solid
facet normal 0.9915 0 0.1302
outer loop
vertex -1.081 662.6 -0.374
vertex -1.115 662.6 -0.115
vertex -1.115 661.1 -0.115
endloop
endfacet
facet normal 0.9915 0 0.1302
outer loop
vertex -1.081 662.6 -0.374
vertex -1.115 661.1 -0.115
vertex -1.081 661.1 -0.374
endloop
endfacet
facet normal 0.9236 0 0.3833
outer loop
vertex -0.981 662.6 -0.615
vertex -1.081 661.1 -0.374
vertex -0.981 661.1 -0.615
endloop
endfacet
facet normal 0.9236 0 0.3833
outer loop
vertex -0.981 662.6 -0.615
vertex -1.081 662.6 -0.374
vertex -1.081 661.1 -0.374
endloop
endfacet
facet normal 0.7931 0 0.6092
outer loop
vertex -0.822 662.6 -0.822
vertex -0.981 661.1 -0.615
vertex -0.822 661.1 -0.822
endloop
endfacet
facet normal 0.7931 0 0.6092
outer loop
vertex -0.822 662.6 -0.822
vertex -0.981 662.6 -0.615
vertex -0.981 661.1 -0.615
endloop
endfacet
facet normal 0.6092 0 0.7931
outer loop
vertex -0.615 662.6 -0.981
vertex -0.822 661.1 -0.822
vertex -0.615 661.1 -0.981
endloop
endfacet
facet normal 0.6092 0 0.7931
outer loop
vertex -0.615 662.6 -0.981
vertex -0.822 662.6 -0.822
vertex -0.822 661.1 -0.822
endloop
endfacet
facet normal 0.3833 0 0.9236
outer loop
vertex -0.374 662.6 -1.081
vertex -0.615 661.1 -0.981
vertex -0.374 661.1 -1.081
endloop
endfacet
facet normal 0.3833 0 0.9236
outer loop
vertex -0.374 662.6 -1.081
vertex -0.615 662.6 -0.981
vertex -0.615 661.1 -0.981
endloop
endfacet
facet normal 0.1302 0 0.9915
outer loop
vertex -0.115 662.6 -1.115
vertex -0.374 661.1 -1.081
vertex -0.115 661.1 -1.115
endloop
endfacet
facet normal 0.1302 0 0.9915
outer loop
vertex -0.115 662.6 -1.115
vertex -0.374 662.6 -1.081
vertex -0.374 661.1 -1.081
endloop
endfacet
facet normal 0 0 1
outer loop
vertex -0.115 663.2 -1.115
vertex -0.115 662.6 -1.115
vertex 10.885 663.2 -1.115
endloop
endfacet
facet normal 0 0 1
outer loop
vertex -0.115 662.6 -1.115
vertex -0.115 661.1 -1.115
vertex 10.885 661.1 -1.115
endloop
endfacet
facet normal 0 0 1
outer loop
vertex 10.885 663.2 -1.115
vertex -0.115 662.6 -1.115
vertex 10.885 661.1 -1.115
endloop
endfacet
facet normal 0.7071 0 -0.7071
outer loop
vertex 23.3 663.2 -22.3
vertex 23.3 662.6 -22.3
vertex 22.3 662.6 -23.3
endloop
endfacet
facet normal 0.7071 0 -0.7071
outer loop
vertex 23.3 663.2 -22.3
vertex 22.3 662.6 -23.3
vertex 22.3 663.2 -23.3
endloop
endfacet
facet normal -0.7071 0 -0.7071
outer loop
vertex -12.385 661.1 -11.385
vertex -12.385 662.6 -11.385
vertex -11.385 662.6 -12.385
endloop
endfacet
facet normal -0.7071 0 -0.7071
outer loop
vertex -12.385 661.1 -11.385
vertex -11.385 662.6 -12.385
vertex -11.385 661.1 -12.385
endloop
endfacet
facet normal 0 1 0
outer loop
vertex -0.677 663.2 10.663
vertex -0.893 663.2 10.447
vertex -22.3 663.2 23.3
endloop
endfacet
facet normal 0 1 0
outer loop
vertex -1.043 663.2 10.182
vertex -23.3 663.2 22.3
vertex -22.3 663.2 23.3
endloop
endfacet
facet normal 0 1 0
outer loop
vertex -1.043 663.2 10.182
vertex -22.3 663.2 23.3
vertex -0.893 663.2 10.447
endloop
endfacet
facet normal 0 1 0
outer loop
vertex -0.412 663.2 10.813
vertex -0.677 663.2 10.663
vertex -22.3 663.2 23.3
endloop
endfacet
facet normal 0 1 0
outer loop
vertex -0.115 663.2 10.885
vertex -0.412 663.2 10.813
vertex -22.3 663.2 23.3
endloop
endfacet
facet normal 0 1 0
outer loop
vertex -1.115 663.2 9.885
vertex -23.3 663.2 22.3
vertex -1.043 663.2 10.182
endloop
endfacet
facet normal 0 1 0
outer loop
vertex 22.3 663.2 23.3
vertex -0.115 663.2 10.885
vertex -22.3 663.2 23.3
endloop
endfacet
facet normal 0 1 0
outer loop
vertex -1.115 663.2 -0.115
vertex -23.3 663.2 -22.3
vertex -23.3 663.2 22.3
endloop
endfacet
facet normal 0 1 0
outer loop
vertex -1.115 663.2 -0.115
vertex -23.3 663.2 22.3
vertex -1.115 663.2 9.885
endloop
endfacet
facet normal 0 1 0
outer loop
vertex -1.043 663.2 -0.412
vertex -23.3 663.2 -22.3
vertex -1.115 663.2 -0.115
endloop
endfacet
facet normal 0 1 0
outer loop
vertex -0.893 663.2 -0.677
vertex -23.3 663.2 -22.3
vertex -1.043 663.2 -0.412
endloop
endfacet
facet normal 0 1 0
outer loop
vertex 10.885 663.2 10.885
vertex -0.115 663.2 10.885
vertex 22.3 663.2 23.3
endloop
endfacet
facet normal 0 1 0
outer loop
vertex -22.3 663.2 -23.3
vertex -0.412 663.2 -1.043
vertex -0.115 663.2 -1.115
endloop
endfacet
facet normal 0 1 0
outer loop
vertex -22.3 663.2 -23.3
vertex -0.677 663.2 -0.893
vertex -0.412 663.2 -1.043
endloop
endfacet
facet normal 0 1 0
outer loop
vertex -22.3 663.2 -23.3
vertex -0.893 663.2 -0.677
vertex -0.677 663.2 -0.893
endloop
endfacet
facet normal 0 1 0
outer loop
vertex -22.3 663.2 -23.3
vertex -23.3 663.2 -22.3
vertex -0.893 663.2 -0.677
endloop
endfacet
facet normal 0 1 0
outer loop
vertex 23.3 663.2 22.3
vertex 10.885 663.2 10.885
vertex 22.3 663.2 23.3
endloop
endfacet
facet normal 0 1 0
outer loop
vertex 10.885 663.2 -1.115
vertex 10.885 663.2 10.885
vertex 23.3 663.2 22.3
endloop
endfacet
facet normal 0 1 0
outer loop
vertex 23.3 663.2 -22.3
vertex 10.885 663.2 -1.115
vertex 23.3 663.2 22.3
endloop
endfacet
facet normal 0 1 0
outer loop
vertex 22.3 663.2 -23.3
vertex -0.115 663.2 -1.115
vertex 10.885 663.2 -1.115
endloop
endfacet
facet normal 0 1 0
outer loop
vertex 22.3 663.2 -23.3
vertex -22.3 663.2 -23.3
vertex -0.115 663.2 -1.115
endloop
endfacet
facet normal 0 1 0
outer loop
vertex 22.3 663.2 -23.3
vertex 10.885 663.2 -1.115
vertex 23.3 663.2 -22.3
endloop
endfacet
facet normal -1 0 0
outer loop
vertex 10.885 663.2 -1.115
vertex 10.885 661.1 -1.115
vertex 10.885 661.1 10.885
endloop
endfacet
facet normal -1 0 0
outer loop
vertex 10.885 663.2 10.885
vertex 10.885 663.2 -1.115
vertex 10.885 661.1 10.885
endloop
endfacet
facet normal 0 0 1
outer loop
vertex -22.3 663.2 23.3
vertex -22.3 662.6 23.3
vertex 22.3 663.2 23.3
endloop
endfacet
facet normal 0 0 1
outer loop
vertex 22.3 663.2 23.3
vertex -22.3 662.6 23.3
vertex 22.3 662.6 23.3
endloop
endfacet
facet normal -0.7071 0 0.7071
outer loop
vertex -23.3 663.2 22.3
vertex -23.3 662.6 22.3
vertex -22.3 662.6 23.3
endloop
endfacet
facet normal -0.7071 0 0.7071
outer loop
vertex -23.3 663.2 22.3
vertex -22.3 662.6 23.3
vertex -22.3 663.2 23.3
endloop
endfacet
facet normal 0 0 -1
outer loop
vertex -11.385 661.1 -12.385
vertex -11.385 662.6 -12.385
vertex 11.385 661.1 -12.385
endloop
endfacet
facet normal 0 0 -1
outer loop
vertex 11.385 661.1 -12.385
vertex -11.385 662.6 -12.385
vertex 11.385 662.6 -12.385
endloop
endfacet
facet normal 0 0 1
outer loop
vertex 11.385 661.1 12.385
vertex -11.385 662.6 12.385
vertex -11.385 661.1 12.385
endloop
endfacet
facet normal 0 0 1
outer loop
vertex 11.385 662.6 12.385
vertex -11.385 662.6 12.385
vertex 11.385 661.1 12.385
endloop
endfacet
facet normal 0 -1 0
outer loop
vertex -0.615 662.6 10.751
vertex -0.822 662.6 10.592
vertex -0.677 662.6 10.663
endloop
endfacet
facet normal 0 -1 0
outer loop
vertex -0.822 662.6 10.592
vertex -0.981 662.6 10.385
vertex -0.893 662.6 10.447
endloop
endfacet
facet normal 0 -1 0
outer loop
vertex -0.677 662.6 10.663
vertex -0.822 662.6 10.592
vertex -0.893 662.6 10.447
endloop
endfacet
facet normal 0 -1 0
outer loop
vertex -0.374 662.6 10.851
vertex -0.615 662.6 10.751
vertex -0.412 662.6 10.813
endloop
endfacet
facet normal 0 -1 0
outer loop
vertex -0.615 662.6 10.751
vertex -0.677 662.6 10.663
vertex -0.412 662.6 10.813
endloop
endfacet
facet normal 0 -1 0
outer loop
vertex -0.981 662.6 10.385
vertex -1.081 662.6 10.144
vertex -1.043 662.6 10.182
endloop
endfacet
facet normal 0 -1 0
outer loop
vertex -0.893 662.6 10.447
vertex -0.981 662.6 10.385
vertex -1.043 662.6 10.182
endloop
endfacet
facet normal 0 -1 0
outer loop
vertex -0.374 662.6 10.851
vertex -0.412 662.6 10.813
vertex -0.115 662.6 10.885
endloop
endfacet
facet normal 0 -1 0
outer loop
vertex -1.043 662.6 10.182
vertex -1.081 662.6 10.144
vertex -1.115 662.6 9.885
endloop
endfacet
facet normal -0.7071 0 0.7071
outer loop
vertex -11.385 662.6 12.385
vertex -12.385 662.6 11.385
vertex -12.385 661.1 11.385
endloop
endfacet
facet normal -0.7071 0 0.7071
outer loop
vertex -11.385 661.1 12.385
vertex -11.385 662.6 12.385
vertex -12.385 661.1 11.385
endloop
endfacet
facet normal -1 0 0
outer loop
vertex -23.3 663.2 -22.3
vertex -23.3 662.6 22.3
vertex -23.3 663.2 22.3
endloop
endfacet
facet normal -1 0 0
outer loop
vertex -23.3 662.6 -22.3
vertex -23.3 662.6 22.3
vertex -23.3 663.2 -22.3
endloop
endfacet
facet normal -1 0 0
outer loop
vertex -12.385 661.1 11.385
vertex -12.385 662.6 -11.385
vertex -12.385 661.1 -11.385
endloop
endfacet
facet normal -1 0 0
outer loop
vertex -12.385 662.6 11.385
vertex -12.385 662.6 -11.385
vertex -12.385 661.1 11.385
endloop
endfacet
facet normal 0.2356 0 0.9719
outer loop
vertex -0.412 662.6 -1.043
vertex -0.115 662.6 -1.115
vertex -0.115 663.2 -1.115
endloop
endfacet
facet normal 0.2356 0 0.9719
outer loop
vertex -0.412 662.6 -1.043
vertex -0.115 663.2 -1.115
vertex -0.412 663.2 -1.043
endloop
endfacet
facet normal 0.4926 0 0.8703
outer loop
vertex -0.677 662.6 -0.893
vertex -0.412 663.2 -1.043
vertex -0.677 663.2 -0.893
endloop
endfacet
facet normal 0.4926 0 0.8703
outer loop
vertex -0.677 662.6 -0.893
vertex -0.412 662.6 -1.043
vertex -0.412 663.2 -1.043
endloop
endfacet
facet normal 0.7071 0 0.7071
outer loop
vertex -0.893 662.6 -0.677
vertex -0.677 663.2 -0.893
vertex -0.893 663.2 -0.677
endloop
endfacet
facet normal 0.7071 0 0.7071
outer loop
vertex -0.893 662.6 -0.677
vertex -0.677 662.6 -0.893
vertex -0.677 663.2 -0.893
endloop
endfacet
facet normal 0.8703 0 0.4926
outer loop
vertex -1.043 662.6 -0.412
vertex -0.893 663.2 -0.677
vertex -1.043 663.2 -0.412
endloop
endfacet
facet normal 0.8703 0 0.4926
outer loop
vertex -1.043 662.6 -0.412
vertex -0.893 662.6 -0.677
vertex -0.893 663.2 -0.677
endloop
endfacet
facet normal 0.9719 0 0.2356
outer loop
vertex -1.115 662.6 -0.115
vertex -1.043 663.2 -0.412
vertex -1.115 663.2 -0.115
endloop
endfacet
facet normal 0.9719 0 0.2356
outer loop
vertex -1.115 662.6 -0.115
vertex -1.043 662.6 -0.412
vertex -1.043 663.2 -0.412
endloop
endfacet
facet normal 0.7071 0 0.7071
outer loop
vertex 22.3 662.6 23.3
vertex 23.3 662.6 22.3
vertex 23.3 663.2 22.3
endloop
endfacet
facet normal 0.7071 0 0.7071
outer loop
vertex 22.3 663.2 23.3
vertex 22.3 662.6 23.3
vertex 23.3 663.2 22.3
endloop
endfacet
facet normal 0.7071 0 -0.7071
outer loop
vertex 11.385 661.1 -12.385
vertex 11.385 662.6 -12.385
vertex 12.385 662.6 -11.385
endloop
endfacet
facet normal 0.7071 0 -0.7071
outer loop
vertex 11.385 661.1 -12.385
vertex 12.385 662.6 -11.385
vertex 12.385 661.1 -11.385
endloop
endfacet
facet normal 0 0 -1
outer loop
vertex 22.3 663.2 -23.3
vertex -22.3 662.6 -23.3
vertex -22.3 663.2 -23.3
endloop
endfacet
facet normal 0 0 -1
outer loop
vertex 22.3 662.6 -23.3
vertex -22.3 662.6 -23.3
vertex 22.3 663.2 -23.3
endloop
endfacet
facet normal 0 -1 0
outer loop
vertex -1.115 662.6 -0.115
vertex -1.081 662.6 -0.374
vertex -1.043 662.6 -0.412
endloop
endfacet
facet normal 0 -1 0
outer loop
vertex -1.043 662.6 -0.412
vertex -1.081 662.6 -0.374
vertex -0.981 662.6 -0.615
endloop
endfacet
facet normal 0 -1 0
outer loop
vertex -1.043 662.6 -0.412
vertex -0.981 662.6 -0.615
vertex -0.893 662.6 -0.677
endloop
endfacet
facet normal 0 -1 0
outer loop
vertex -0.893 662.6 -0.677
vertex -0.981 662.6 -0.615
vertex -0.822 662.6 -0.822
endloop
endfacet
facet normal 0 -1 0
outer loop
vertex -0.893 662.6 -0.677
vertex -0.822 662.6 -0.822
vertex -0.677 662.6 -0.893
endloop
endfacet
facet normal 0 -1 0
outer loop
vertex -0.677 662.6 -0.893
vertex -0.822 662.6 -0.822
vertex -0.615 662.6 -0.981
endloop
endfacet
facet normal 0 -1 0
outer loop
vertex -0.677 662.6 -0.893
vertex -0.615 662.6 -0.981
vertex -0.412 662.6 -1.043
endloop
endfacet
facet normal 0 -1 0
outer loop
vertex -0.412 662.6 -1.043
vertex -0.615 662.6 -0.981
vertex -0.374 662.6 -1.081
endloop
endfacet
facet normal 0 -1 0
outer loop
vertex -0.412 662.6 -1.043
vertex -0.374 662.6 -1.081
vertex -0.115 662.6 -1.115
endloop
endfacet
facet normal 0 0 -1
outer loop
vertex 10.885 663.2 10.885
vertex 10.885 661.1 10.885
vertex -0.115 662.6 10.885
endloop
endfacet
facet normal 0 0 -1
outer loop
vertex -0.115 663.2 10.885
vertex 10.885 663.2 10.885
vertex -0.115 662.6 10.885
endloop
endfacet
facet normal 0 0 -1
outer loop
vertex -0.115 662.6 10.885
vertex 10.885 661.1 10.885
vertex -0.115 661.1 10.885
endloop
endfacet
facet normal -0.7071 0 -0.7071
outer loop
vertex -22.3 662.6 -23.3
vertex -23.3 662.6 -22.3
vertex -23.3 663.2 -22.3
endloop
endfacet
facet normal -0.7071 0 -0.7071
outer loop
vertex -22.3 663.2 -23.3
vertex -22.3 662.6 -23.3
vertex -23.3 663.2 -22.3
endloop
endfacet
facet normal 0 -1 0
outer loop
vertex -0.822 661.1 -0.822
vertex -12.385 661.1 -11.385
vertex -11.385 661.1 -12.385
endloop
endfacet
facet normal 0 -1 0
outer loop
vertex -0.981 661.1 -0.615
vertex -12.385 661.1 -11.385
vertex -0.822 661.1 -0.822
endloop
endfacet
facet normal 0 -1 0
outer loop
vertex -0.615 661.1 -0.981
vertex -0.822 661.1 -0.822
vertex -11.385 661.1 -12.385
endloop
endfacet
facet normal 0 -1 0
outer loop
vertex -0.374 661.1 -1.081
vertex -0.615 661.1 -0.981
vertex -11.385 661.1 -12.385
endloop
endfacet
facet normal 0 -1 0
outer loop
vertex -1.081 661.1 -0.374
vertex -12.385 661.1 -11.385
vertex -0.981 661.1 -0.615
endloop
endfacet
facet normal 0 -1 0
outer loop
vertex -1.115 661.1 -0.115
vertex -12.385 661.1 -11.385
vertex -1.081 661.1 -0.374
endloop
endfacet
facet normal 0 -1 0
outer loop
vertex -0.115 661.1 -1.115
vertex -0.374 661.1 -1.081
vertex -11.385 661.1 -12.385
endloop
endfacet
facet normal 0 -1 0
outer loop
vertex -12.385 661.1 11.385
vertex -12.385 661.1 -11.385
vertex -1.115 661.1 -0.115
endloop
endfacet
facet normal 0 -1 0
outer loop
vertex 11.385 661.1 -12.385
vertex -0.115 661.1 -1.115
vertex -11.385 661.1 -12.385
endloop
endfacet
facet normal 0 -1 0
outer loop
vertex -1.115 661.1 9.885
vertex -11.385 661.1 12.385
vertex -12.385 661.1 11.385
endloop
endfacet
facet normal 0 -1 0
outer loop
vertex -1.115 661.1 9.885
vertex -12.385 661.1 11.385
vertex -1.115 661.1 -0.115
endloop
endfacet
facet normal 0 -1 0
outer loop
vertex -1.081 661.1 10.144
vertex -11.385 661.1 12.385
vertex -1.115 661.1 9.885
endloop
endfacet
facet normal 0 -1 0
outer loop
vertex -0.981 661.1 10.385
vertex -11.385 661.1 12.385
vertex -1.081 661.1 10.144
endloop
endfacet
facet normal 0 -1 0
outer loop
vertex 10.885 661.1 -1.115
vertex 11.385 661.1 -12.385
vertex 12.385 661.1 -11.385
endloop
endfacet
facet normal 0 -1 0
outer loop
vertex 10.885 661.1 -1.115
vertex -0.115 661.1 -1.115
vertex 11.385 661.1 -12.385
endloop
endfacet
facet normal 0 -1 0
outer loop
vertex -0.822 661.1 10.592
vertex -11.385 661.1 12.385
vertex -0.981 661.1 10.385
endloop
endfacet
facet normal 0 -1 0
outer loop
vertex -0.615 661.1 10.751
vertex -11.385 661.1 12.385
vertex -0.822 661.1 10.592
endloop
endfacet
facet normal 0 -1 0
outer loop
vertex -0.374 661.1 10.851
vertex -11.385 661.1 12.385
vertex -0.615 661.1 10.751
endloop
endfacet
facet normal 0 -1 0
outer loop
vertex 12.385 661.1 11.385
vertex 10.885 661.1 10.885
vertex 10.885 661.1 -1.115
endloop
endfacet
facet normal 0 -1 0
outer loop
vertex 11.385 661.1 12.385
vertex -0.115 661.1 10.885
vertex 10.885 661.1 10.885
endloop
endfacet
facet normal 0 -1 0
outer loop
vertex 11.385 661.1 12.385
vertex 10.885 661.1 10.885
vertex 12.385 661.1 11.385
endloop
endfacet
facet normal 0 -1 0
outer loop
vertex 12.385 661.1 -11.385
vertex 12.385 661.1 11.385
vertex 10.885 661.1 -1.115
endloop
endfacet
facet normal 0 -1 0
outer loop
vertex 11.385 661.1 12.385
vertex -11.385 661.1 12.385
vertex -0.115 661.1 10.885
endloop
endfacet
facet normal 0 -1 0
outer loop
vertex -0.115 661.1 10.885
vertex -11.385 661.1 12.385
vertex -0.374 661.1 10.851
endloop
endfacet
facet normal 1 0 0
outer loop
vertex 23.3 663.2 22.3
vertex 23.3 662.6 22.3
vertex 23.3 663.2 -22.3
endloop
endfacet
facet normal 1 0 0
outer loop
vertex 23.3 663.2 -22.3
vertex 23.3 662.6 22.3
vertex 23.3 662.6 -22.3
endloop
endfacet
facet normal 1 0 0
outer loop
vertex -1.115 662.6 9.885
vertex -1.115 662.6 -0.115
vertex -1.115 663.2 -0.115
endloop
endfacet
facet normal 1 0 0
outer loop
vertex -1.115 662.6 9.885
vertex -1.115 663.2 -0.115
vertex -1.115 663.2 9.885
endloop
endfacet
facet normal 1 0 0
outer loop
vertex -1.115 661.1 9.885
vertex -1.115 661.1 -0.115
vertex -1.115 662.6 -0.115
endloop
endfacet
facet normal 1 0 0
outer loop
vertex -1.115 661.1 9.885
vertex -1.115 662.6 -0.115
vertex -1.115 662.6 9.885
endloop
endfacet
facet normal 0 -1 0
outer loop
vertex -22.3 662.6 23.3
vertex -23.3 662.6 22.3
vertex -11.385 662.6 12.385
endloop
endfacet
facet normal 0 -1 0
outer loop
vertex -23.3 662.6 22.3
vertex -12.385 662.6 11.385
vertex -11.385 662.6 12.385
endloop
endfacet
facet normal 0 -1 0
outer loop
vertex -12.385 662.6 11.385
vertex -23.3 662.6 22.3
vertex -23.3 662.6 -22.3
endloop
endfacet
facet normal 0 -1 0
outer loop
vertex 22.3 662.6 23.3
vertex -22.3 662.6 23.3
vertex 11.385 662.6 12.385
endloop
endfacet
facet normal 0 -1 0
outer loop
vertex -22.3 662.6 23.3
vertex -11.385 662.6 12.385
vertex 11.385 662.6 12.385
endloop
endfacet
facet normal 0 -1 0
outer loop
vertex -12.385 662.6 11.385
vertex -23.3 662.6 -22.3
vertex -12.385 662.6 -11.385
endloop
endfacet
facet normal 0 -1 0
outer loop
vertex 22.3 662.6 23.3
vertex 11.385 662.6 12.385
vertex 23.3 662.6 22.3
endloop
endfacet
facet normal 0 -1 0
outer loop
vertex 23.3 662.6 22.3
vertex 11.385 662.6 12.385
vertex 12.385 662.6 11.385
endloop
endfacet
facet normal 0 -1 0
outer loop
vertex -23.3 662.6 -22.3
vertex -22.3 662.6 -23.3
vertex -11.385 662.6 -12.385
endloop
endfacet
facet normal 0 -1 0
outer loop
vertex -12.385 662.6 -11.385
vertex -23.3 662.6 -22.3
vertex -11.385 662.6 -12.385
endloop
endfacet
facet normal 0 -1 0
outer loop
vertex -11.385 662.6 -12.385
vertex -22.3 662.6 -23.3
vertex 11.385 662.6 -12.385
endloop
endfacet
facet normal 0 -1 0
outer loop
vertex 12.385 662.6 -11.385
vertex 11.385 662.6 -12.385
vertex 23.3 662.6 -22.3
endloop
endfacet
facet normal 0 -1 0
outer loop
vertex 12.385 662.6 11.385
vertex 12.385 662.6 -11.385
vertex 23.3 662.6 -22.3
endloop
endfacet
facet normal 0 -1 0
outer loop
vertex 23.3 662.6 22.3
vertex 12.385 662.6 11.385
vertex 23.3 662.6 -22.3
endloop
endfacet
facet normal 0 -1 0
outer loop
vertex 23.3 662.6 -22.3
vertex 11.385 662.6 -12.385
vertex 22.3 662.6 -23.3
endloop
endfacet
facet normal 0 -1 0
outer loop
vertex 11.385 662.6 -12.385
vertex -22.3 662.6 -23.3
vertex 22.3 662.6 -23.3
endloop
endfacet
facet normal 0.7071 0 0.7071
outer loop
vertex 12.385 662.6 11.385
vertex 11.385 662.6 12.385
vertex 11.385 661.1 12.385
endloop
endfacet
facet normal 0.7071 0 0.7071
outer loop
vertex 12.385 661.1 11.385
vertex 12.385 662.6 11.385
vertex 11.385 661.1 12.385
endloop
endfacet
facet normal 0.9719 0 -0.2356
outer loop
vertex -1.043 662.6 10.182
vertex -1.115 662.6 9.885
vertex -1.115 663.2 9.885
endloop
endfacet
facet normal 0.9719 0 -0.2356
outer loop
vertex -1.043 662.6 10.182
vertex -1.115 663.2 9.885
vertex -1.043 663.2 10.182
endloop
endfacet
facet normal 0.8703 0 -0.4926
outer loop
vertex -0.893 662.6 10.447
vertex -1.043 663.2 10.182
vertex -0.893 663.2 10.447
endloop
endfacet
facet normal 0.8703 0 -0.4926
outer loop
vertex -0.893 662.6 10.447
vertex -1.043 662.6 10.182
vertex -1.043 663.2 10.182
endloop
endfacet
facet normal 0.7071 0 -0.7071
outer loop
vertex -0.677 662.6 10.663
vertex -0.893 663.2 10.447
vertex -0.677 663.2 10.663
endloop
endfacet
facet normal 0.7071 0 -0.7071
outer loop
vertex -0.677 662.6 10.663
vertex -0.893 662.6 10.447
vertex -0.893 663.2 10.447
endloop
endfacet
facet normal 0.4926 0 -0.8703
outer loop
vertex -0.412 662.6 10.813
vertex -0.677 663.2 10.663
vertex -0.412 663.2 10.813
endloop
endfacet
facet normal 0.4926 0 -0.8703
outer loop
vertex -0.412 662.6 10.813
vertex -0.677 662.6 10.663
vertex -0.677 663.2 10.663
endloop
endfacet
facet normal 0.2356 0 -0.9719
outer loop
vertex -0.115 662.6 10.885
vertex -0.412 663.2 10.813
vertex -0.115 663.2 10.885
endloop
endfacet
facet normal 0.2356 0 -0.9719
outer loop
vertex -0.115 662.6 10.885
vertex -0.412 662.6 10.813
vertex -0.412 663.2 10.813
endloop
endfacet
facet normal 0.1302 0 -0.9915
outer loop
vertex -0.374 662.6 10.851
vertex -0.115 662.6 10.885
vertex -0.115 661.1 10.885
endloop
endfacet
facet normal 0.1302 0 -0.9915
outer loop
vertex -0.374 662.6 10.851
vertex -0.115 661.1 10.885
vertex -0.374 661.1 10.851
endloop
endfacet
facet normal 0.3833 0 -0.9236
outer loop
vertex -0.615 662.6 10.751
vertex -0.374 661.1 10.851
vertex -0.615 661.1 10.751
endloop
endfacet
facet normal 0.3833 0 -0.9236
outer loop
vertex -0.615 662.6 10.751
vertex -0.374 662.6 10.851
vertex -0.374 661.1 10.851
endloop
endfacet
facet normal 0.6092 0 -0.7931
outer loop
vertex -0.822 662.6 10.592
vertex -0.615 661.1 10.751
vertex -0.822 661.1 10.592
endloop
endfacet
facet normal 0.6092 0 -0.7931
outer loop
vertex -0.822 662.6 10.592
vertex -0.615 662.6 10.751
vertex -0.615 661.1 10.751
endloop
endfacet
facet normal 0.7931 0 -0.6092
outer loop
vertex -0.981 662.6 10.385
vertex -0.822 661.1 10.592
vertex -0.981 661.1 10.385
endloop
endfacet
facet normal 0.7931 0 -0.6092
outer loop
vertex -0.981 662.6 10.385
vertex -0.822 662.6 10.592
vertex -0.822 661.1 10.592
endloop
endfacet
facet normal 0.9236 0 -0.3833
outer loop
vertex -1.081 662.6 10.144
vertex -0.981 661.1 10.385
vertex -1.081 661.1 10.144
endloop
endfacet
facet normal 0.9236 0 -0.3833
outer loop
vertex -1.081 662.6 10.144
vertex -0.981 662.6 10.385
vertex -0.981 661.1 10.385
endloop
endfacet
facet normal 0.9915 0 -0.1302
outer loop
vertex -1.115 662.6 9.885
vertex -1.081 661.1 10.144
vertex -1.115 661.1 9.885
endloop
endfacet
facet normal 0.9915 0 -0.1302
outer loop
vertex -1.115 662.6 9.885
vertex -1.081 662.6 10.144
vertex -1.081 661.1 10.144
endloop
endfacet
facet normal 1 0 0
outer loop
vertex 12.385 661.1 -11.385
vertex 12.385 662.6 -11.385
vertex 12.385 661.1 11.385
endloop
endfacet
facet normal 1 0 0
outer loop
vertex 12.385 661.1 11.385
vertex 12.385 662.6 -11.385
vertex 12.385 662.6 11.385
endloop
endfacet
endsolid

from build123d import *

# Parameters (mm, degrees)
SKETCH008_W     = 24.77
SKETCH008_H     = 24.77
PAD004_DEPTH    = 1.5
SKETCH009_W     = 46.6
SKETCH009_H     = 46.6
PAD005_DEPTH    = 0.6
CHAMFER001_SIZE = 1


with BuildPart() as part:
    # Sketch008 → Pad004 (new body)
    with BuildSketch(Plane.XZ.offset(-662.6)):
        Rectangle(SKETCH008_W, SKETCH008_H)
        with BuildLine():
            Line((-0.115186, -1.115), (10.885, -1.115))
            Line((10.885, -1.115), (10.885, 10.885))
            Line((10.885, 10.885), (-0.115186, 10.885))
            ThreePointArc((-0.115186, 10.885), (-0.822161, 10.592161), (-1.115, 9.885186))
            Line((-1.115, 9.885186), (-1.115, -0.115186))
            ThreePointArc((-1.115, -0.115186), (-0.822161, -0.822161), (-0.115186, -1.115))
        make_face(mode=Mode.SUBTRACT)
    extrude(amount=PAD004_DEPTH)

    # Sketch009 (on Face11 of Pad004) → Pad005 (join)
    with BuildSketch(Plane(origin=(0, 662.6, 0), x_dir=(1, 0, 0), z_dir=(0, 1, 0))):
        Rectangle(SKETCH009_W, SKETCH009_H)
        with BuildLine():
            ThreePointArc((-0.115186, 1.115), (-0.79262, 0.79262), (-1.115, 0.115186))
            Line((-1.115, 0.115186), (-1.115, -9.885186))
            ThreePointArc((-1.115, -9.885186), (-0.79262, -10.56262), (-0.115186, -10.885))
            Line((10.885, -10.885), (-0.115186, -10.885))
            Line((10.885, 1.115), (10.885, -10.885))
            Line((-0.115186, 1.115), (10.885, 1.115))
        make_face(mode=Mode.SUBTRACT)
    extrude(amount=PAD005_DEPTH)

    # Chamfer001
    chamfer001_edges = [part.edges().sort_by_distance(p)[0] for p in [
        (12.385, 661.85, 12.385),
        (-12.385, 661.85, 12.385),
        (-12.385, 661.85, -12.385),
        (12.385, 661.85, -12.385),
        (23.3, 662.9, 23.3),
        (-23.3, 662.9, 23.3),
        (23.3, 662.9, -23.3),
        (-23.3, 662.9, -23.3),
    ]]
    chamfer(chamfer001_edges, length=CHAMFER001_SIZE)


solid = part.part
